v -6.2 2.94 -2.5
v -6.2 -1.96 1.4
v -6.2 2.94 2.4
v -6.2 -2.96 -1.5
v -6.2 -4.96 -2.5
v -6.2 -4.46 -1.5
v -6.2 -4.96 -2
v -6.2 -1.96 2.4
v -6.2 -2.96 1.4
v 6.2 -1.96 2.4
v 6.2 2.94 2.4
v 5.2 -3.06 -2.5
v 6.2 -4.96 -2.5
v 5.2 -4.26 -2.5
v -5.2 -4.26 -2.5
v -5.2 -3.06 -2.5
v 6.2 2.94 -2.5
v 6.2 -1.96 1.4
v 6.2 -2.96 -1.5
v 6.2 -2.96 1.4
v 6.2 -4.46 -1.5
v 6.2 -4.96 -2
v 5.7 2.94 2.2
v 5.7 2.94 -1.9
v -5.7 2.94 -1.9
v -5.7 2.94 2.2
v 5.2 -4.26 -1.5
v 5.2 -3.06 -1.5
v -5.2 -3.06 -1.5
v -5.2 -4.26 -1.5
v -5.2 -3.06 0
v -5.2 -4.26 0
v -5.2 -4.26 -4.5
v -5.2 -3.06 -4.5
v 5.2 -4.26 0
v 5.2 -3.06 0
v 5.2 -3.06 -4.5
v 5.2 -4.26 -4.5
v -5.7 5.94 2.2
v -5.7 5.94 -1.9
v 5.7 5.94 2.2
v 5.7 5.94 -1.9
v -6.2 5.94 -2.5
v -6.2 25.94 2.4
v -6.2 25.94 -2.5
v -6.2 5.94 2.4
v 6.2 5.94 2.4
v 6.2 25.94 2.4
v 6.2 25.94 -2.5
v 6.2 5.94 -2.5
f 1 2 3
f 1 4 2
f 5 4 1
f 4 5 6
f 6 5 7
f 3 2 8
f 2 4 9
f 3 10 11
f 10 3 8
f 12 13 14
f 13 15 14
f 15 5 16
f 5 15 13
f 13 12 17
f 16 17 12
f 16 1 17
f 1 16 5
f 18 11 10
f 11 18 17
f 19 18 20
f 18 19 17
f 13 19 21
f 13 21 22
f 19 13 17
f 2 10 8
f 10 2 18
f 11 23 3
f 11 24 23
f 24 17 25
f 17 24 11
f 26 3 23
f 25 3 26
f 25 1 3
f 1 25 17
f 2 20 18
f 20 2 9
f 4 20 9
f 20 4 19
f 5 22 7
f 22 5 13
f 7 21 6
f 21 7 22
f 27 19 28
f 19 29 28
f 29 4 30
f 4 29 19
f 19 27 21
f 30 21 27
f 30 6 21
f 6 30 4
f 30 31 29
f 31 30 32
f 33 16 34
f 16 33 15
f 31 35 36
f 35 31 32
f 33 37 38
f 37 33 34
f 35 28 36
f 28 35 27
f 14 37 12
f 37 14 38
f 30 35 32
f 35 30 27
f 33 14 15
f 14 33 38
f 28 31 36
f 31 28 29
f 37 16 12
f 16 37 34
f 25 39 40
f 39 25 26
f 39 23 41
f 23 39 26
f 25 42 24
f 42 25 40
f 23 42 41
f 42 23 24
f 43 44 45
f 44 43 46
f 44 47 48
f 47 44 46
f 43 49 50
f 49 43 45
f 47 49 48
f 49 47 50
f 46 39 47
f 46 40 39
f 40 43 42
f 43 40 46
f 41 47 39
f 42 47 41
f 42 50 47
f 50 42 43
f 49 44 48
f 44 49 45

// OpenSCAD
N=4;
A=2.4+N*2.5;
rotate([0,0,180])
translate([-A/2,-2.94,-2.5])
{
	cube([A,4.9,4.9]);
	cube([A,5.9,3.9]);
	hull()
	{
		cube([A,7.4,1]);
		cube([A,7.9,0.5]);
	}
	translate([1,6,-2])cube([A-2,1.2,4.5]); // Assumes cropped pins
	// Plug
	translate([0.5,-20,0.6])cube([A-1,21,4.1]);
	translate([0,-23,0])cube([A,20,4.9]);
}
